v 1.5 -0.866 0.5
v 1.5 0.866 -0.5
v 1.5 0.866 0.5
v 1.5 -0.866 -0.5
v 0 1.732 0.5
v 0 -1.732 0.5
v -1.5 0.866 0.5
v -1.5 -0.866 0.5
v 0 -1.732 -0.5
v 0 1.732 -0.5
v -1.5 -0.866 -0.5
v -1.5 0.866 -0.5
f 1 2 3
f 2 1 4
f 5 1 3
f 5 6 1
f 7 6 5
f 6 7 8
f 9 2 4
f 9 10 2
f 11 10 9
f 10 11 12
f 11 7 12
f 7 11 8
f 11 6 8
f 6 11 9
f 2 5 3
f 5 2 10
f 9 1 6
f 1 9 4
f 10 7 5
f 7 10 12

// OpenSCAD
//nut_M2(1,0.1);
//nut_M2_5(1,0.1);
nut_M3(1,0.1);
//nut_M10(1,0.1);

module nut_M2(height,clear)
{
    radius = 2;

    nut_hexagonal(radius,height,clear);
}

module nut_M2_5(height,clear)
{
    radius = 2.5;

    nut_hexagonal(radius,height,clear);
}

module nut_M3(height,clear)
{
    radius = 3;

    nut_hexagonal(radius,height,clear);
}

module nut_M10(height,clear)
{
    radius = 10;

    nut_hexagonal(radius,height,clear);
}

module nut_hexagonal(radius,height,clear)
{
	radius = radius;
    angle = 360/6;
	cote = (radius)/tan(angle);

	union()
    {
		rotate([0,0,0])
			cube([radius,cote,height],center=true);
		rotate([0,0,angle])
			cube([radius,cote,height],center=true);
		rotate([0,0,2*angle])
			cube([radius,cote,height],center=true);
	}

}
